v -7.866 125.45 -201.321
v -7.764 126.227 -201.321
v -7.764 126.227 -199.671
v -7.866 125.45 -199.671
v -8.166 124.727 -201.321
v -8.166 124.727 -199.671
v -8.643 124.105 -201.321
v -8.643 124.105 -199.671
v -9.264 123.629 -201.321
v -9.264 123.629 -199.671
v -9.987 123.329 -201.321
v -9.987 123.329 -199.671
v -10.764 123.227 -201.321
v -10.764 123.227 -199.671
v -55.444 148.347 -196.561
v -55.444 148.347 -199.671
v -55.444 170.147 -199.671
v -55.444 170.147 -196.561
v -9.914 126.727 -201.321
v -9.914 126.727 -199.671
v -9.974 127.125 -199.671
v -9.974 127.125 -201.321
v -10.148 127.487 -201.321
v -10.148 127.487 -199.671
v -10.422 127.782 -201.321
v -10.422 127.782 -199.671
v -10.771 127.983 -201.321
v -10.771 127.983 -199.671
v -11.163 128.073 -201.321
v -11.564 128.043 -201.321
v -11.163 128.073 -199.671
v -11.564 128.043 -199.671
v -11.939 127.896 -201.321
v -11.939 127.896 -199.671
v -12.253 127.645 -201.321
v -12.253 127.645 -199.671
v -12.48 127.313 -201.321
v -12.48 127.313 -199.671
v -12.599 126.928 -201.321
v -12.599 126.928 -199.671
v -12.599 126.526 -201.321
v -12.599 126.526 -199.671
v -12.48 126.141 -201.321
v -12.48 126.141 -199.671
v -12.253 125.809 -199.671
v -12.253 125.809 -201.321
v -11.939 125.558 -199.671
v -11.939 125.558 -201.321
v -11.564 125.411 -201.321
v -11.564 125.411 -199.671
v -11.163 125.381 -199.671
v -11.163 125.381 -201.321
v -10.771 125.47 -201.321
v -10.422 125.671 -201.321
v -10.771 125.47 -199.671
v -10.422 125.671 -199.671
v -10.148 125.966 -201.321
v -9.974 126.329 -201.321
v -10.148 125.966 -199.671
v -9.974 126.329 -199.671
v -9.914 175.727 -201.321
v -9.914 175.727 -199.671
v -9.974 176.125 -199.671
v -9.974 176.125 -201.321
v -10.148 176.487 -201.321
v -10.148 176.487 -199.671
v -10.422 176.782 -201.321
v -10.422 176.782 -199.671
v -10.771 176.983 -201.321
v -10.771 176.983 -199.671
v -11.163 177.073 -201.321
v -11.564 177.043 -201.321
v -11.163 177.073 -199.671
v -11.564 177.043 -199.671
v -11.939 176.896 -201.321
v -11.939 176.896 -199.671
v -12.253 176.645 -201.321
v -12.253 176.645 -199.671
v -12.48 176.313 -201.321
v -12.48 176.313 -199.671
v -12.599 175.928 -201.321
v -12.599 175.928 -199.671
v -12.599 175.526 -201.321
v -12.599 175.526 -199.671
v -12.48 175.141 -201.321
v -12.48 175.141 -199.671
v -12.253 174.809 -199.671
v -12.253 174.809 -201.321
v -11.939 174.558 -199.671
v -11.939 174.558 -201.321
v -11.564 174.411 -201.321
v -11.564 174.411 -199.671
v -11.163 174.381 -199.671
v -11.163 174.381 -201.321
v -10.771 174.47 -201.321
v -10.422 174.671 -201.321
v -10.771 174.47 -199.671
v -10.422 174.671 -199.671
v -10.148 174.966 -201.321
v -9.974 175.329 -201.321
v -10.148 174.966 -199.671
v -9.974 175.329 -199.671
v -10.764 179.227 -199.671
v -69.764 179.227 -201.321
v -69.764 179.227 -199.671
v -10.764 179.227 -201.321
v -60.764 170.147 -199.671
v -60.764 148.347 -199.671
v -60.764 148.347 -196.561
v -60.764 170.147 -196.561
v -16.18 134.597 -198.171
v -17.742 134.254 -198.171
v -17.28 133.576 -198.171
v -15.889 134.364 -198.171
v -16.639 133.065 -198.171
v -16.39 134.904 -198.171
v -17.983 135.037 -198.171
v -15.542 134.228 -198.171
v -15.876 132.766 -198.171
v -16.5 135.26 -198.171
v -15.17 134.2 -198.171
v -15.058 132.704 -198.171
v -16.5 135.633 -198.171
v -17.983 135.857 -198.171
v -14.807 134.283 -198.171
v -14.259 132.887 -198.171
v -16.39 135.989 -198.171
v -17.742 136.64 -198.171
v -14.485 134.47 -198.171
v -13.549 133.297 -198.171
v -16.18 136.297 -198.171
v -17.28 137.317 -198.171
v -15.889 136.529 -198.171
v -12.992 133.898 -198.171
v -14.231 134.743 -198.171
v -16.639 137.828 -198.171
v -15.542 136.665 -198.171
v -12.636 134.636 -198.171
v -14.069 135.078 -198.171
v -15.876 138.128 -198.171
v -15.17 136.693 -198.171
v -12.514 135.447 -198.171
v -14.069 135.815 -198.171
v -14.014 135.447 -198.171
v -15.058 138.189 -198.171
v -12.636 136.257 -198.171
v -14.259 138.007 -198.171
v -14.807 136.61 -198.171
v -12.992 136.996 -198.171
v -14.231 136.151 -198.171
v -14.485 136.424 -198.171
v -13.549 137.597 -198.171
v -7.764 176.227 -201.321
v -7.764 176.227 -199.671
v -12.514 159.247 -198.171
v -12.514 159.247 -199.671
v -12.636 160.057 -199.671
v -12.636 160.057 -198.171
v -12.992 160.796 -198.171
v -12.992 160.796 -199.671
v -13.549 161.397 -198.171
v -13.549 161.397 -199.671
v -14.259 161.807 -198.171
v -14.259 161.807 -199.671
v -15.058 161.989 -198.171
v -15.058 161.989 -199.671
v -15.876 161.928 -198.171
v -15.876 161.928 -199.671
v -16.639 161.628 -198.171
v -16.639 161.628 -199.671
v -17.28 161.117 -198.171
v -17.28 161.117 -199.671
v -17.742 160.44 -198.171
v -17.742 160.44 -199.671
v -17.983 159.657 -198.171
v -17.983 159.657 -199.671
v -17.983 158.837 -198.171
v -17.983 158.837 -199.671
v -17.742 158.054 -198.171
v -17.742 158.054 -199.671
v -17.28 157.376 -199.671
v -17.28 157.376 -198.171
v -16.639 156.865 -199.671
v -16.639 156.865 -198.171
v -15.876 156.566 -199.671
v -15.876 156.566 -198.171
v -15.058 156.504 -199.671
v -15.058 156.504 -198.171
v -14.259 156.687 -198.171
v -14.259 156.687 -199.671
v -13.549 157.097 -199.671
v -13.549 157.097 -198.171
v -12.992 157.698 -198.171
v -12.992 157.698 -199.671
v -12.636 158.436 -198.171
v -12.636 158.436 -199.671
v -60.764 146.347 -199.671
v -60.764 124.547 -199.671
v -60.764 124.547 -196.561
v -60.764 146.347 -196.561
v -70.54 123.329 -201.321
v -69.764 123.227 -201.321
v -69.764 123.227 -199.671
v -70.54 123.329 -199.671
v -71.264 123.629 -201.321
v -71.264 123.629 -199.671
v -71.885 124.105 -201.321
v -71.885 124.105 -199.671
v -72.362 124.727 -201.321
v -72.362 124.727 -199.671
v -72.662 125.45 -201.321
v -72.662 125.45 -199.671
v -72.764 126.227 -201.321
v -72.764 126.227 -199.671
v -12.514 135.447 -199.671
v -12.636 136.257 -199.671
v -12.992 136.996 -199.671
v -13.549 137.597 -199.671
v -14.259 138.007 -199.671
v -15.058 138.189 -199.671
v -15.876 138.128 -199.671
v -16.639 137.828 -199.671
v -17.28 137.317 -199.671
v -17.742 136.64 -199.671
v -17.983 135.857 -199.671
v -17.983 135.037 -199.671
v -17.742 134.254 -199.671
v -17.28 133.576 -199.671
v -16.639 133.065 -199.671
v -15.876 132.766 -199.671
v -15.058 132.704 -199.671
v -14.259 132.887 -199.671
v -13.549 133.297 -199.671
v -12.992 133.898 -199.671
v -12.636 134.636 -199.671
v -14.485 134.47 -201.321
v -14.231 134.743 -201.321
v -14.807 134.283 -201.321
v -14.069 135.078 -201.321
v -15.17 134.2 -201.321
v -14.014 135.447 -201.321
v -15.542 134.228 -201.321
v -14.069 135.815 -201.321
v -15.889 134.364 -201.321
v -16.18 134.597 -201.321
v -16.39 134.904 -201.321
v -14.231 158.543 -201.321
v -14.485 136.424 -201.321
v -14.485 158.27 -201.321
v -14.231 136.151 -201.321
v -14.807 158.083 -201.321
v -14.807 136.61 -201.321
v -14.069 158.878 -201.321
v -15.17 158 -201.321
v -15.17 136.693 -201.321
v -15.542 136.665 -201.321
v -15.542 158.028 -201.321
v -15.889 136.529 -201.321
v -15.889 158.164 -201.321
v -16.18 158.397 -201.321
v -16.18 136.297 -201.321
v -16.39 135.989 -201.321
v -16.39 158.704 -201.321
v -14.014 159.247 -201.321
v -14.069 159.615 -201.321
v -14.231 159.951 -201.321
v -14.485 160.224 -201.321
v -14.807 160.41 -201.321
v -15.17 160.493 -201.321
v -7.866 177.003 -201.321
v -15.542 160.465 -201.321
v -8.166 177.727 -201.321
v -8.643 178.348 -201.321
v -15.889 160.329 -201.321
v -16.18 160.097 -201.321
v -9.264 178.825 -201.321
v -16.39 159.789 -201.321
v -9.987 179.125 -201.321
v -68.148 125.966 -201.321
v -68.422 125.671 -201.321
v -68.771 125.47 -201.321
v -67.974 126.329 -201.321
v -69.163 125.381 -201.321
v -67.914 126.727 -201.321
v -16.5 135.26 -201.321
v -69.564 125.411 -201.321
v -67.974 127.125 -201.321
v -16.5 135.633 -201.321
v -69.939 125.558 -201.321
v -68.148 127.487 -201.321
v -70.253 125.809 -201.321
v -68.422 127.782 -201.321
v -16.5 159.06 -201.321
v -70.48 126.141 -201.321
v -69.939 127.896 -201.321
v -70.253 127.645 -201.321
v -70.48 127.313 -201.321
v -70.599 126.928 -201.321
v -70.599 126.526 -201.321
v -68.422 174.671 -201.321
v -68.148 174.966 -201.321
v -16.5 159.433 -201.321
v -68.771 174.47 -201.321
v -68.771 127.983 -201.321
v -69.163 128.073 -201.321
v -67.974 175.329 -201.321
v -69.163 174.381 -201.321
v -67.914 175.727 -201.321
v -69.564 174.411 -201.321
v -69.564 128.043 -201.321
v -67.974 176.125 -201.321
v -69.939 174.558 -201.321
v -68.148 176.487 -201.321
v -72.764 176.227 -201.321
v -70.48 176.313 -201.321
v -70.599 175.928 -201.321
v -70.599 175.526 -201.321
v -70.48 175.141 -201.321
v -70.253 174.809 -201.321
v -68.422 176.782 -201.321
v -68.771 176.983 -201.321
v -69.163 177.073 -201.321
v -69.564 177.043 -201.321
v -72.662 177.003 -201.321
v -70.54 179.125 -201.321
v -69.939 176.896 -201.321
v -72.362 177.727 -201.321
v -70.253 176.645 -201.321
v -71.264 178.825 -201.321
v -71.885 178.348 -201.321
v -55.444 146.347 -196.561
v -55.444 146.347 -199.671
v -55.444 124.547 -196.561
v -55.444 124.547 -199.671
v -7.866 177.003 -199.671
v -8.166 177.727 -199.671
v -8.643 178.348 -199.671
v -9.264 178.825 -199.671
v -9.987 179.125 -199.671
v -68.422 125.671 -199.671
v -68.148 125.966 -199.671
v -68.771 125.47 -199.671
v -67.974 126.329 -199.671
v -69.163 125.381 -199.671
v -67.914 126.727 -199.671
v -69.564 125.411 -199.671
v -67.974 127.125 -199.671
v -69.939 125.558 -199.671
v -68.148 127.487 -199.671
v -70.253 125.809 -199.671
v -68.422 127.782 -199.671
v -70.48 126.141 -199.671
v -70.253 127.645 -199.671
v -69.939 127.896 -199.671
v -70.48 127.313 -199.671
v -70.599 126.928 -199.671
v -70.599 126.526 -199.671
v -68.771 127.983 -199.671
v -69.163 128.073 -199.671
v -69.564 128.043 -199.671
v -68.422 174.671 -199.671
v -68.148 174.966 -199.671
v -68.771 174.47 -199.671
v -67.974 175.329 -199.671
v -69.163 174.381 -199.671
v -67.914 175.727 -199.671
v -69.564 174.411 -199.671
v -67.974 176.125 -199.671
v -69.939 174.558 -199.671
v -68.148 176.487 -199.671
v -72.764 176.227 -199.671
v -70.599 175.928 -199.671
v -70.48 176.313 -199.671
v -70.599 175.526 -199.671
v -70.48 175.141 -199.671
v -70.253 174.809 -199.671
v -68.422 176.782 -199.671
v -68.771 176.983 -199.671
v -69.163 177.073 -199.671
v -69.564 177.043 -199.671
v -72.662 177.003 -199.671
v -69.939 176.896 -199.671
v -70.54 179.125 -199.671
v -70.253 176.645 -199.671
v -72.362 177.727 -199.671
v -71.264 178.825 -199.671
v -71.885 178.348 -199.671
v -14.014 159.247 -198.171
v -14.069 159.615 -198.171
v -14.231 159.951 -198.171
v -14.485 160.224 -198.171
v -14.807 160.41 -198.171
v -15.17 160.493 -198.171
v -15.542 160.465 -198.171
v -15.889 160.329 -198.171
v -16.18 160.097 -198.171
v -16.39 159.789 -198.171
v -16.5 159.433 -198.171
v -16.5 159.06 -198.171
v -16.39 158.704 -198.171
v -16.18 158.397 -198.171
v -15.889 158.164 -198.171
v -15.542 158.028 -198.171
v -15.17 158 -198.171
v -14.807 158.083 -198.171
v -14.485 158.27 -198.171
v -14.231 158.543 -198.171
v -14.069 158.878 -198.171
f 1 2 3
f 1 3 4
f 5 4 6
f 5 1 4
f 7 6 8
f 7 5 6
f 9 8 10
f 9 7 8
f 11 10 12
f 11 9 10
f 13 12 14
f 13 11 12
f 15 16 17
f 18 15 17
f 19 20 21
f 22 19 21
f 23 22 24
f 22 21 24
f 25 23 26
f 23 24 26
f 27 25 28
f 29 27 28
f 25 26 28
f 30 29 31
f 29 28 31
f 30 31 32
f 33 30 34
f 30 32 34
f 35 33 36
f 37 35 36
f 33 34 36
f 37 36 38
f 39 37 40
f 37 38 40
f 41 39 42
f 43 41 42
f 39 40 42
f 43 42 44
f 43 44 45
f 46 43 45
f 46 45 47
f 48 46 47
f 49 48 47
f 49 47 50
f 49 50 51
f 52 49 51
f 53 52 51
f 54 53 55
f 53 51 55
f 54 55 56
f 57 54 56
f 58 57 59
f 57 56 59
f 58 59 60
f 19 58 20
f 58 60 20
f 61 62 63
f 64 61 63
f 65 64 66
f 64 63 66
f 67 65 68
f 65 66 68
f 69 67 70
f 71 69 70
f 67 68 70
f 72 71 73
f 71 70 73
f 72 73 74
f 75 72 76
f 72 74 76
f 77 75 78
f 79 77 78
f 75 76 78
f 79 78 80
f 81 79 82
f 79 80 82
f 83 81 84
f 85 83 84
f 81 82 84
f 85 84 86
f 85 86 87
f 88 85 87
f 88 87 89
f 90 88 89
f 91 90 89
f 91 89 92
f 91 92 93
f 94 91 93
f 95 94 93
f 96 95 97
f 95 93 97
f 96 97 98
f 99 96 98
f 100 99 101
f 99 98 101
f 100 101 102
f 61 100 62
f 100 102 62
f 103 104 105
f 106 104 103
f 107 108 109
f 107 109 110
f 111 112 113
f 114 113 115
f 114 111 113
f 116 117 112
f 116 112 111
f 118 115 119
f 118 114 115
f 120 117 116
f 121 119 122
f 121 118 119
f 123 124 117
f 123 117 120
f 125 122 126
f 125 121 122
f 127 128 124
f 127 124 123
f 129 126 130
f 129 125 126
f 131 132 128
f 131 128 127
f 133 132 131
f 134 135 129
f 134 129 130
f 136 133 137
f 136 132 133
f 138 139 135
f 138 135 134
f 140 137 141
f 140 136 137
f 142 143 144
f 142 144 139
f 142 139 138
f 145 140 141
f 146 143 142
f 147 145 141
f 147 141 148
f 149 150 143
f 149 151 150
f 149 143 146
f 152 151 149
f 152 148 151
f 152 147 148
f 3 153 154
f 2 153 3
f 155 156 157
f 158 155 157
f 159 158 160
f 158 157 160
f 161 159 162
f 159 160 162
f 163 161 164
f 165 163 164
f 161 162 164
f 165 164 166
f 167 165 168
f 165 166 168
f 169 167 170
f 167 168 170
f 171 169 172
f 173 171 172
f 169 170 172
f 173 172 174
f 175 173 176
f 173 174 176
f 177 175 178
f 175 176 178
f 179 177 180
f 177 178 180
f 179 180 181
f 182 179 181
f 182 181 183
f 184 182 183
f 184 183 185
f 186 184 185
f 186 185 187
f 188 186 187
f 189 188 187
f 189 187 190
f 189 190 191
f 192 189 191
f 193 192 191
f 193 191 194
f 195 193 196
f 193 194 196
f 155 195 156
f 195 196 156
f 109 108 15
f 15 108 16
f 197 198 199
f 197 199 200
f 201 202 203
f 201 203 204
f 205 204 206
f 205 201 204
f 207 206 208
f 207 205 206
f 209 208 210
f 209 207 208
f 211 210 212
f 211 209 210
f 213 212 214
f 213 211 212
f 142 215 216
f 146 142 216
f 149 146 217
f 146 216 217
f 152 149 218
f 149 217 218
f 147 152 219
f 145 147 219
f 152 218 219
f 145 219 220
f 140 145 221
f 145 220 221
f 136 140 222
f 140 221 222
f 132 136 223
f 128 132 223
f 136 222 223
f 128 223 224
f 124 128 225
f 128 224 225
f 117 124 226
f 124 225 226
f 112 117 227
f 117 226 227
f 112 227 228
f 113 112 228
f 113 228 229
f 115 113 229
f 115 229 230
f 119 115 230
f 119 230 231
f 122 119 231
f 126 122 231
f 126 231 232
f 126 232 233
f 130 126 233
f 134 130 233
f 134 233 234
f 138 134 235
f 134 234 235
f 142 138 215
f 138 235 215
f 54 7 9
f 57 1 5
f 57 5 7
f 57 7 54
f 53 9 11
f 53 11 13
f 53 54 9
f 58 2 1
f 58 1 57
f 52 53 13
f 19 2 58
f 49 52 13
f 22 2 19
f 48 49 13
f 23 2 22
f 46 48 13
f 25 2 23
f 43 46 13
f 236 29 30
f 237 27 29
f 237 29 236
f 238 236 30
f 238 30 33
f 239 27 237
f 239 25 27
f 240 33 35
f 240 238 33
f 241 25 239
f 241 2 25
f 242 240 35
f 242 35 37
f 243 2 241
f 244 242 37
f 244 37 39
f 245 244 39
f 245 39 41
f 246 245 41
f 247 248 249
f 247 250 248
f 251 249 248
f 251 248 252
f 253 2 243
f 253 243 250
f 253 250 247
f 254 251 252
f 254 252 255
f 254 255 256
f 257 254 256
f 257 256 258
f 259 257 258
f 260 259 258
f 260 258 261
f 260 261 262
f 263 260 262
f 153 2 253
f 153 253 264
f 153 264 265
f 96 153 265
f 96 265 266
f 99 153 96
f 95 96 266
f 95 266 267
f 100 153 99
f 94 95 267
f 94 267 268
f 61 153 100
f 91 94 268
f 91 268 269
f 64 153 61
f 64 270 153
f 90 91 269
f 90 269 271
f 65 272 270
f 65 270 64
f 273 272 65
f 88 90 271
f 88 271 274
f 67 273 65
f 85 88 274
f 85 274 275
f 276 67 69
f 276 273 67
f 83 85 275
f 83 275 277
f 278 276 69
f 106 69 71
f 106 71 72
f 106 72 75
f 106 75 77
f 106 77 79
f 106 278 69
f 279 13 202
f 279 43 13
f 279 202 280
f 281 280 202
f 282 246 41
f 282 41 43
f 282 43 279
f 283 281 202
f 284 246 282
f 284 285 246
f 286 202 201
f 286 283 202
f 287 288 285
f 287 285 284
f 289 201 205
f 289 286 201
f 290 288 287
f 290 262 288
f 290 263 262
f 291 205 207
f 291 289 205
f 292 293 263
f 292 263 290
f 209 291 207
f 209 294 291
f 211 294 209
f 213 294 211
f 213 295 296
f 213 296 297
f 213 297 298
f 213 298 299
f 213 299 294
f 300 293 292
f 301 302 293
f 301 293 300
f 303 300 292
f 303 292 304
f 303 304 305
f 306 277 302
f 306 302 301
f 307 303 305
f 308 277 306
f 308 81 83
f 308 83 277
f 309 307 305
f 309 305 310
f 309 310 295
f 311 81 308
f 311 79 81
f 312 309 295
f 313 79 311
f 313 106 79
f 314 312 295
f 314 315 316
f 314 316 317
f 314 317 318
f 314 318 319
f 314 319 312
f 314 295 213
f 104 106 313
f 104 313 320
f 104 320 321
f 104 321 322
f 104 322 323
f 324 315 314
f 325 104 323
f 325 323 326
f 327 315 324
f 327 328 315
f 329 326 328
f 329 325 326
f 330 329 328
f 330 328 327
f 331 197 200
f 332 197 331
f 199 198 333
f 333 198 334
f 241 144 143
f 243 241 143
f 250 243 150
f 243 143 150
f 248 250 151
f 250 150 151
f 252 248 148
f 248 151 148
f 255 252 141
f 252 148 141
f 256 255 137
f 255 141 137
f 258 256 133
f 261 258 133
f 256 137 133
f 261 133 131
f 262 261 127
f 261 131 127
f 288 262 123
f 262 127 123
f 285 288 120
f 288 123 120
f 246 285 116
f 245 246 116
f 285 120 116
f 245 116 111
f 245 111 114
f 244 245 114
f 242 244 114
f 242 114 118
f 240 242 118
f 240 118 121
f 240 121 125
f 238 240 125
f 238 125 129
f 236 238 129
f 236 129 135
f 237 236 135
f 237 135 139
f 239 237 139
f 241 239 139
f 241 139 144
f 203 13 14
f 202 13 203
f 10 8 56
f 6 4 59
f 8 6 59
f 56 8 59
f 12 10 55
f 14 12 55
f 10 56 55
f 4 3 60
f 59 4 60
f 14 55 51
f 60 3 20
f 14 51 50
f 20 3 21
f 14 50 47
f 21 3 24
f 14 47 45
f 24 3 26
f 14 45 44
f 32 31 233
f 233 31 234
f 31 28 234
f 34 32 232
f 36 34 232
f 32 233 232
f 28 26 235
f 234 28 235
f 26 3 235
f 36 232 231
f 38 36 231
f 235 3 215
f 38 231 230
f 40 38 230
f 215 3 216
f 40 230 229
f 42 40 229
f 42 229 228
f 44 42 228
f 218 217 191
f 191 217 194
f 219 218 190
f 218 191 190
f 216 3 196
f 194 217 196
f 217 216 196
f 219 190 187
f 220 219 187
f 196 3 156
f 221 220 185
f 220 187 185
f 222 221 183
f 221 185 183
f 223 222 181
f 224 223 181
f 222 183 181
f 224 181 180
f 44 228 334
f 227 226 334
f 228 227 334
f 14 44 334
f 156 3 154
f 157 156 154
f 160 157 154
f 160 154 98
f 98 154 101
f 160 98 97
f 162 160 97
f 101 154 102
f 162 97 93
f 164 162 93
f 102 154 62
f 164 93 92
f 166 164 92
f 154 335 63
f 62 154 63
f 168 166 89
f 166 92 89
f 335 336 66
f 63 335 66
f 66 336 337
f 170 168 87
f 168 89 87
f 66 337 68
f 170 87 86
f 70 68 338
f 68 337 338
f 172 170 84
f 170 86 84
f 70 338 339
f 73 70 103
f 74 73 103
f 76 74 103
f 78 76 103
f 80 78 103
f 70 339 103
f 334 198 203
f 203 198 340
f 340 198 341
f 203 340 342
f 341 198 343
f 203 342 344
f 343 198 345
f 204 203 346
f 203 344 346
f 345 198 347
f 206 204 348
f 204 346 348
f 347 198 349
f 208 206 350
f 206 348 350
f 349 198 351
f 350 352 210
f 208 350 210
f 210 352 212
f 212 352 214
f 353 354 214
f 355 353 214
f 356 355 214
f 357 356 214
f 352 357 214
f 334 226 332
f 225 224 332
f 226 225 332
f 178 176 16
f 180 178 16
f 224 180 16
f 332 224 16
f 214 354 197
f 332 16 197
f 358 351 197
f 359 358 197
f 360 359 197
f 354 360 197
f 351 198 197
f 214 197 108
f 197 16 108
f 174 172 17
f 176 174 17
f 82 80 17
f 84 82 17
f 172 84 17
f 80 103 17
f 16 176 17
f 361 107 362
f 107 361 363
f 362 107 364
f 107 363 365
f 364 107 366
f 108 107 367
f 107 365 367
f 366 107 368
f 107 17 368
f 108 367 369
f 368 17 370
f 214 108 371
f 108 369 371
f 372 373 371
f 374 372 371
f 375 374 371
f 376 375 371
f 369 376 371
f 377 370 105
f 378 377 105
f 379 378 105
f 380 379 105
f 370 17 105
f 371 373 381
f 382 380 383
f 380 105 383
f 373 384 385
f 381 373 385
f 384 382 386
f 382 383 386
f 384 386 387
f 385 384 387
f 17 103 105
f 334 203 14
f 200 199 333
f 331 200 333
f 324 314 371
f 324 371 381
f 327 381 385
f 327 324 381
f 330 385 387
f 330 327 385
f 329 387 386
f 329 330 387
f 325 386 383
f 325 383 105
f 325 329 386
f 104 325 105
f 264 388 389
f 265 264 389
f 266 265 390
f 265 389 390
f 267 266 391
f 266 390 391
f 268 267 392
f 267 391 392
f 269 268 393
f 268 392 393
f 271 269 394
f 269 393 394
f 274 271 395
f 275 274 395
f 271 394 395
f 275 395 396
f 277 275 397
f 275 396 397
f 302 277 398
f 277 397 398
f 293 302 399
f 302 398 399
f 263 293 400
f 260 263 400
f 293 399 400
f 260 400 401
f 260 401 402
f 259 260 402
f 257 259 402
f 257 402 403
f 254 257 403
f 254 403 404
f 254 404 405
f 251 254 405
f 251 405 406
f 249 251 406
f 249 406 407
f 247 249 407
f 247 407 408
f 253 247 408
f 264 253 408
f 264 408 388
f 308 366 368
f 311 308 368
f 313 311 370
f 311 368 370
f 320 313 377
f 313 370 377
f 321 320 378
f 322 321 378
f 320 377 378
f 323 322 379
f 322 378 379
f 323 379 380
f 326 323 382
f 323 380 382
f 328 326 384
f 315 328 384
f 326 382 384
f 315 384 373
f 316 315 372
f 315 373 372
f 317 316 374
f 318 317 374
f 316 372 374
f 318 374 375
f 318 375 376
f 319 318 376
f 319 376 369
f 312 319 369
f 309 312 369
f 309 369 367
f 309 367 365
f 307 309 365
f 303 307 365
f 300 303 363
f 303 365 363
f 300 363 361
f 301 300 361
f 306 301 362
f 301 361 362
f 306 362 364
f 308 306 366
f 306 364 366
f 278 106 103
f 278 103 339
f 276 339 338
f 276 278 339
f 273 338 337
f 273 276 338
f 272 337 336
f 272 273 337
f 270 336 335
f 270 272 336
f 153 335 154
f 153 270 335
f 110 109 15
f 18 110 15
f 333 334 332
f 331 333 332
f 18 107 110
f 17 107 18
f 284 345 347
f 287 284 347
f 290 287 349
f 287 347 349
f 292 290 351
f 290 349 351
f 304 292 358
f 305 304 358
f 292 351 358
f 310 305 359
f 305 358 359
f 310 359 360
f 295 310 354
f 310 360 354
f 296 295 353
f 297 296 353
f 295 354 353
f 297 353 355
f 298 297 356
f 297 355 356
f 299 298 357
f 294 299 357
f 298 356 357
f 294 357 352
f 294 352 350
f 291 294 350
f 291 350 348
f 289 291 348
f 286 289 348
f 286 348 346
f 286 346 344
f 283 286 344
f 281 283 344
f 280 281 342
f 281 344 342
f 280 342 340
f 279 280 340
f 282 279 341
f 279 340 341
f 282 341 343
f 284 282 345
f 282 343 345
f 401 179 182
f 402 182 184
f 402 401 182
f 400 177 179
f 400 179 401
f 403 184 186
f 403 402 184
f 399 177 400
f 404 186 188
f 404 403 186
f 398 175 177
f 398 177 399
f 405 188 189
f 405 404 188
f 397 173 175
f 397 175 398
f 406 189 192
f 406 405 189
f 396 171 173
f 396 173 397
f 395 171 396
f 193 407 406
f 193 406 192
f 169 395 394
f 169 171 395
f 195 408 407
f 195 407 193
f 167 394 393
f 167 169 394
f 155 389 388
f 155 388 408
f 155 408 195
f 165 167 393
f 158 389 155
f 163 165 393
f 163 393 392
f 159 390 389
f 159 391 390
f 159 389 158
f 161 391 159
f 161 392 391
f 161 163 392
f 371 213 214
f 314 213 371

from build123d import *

# Parameters (mm, degrees)
EXTRUDE_1_DEPTH     = 1.65
SKETCH_2_R          = 1.35
CUT_EXTRUDE_1_DEPTH = 1.65
SKETCH_3_W          = 5.32
SKETCH_3_H          = 21.8
EXTRUDE_2_DEPTH     = 3.11
SKETCH_4_R          = 2.75
EXTRUDE_3_DEPTH     = 1.5
CUT_EXTRUDE_2_REACH = 5.15
SKETCH_5_R          = 1.25


with BuildPart() as part:
    # 草图1 → 凸台-拉伸1 (new body)
    with BuildSketch(Plane(origin=(23.590329777, 87.741111173, -201.321110376), x_dir=(1, 0, 0), z_dir=(0, 0, 1))):
        with BuildLine():
            Line((-93.354201199, 91.485679355), (-34.354201199, 91.485679355))
            ThreePointArc((-34.354201199, 91.485679355), (-32.232880856, 90.606999698), (-31.354201199, 88.485679355))
            Line((-31.354201199, 88.485679355), (-31.354201199, 38.485679355))
            ThreePointArc((-31.354201199, 38.485679355), (-32.232880856, 36.364359011), (-34.354201199, 35.485679355))
            Line((-34.354201199, 35.485679355), (-93.354201199, 35.485679355))
            ThreePointArc((-93.354201199, 35.485679355), (-95.475521543, 36.364359011), (-96.354201199, 38.485679355))
            Line((-96.354201199, 38.485679355), (-96.354201199, 88.485679355))
            ThreePointArc((-96.354201199, 88.485679355), (-95.475521543, 90.606999698), (-93.354201199, 91.485679355))
        make_face()
    extrude(amount=EXTRUDE_1_DEPTH)

    # 草图2 → 切除-拉伸1 (cut)
    with BuildSketch(Plane.XY.offset(-199.671110376)):
        with Locations((-69.263871422, 175.726790528)):
            Circle(SKETCH_2_R)
        with Locations((-11.263871422, 175.726790528)):
            Circle(SKETCH_2_R)
        with Locations((-69.263871422, 126.726790528)):
            Circle(SKETCH_2_R)
        with Locations((-11.263871422, 126.726790528)):
            Circle(SKETCH_2_R)
    extrude(amount=-CUT_EXTRUDE_1_DEPTH, mode=Mode.SUBTRACT)

    # 草图3 → 凸台-拉伸2 (add)
    with BuildSketch(Plane.XY.offset(-199.671110376)):
        with Locations((-58.103871422, 159.246790528)):
            Rectangle(SKETCH_3_W, SKETCH_3_H)
        with Locations((-58.103871422, 135.446790528)):
            Rectangle(SKETCH_3_W, SKETCH_3_H)
    extrude(amount=EXTRUDE_2_DEPTH)

    # 草图4 → 凸台-拉伸3 (add)
    with BuildSketch(Plane.XY.offset(-199.671110376)):
        with Locations((-15.263871422, 135.446790528)):
            Circle(SKETCH_4_R)
        with Locations((-15.263871422, 159.246790528)):
            Circle(SKETCH_4_R)
    extrude(amount=EXTRUDE_3_DEPTH)

    # 草图5 → 切除-拉伸2 (cut, up to next)
    with BuildSketch(Plane.XY.offset(-198.171110376), mode=Mode.PRIVATE) as cut_extrude_2_sk1:
        with Locations((-15.263871422, 159.246790528)):
            Circle(SKETCH_5_R)
    cut_extrude_2_tool1 = extrude(cut_extrude_2_sk1.sketch, amount=-CUT_EXTRUDE_2_REACH, mode=Mode.PRIVATE) & part.part
    add(cut_extrude_2_tool1.solids().sort_by_distance((-15.263871, 159.246791, -198.17111))[0], mode=Mode.SUBTRACT)
    # 草图5 → 切除-拉伸2 (cut, up to next)
    with BuildSketch(Plane.XY.offset(-198.171110376), mode=Mode.PRIVATE) as cut_extrude_2_sk2:
        with Locations((-15.263871422, 135.446790528)):
            Circle(SKETCH_5_R)
    cut_extrude_2_tool2 = extrude(cut_extrude_2_sk2.sketch, amount=-CUT_EXTRUDE_2_REACH, mode=Mode.PRIVATE) & part.part
    add(cut_extrude_2_tool2.solids().sort_by_distance((-15.263871, 135.446791, -198.17111))[0], mode=Mode.SUBTRACT)


solid = part.part
